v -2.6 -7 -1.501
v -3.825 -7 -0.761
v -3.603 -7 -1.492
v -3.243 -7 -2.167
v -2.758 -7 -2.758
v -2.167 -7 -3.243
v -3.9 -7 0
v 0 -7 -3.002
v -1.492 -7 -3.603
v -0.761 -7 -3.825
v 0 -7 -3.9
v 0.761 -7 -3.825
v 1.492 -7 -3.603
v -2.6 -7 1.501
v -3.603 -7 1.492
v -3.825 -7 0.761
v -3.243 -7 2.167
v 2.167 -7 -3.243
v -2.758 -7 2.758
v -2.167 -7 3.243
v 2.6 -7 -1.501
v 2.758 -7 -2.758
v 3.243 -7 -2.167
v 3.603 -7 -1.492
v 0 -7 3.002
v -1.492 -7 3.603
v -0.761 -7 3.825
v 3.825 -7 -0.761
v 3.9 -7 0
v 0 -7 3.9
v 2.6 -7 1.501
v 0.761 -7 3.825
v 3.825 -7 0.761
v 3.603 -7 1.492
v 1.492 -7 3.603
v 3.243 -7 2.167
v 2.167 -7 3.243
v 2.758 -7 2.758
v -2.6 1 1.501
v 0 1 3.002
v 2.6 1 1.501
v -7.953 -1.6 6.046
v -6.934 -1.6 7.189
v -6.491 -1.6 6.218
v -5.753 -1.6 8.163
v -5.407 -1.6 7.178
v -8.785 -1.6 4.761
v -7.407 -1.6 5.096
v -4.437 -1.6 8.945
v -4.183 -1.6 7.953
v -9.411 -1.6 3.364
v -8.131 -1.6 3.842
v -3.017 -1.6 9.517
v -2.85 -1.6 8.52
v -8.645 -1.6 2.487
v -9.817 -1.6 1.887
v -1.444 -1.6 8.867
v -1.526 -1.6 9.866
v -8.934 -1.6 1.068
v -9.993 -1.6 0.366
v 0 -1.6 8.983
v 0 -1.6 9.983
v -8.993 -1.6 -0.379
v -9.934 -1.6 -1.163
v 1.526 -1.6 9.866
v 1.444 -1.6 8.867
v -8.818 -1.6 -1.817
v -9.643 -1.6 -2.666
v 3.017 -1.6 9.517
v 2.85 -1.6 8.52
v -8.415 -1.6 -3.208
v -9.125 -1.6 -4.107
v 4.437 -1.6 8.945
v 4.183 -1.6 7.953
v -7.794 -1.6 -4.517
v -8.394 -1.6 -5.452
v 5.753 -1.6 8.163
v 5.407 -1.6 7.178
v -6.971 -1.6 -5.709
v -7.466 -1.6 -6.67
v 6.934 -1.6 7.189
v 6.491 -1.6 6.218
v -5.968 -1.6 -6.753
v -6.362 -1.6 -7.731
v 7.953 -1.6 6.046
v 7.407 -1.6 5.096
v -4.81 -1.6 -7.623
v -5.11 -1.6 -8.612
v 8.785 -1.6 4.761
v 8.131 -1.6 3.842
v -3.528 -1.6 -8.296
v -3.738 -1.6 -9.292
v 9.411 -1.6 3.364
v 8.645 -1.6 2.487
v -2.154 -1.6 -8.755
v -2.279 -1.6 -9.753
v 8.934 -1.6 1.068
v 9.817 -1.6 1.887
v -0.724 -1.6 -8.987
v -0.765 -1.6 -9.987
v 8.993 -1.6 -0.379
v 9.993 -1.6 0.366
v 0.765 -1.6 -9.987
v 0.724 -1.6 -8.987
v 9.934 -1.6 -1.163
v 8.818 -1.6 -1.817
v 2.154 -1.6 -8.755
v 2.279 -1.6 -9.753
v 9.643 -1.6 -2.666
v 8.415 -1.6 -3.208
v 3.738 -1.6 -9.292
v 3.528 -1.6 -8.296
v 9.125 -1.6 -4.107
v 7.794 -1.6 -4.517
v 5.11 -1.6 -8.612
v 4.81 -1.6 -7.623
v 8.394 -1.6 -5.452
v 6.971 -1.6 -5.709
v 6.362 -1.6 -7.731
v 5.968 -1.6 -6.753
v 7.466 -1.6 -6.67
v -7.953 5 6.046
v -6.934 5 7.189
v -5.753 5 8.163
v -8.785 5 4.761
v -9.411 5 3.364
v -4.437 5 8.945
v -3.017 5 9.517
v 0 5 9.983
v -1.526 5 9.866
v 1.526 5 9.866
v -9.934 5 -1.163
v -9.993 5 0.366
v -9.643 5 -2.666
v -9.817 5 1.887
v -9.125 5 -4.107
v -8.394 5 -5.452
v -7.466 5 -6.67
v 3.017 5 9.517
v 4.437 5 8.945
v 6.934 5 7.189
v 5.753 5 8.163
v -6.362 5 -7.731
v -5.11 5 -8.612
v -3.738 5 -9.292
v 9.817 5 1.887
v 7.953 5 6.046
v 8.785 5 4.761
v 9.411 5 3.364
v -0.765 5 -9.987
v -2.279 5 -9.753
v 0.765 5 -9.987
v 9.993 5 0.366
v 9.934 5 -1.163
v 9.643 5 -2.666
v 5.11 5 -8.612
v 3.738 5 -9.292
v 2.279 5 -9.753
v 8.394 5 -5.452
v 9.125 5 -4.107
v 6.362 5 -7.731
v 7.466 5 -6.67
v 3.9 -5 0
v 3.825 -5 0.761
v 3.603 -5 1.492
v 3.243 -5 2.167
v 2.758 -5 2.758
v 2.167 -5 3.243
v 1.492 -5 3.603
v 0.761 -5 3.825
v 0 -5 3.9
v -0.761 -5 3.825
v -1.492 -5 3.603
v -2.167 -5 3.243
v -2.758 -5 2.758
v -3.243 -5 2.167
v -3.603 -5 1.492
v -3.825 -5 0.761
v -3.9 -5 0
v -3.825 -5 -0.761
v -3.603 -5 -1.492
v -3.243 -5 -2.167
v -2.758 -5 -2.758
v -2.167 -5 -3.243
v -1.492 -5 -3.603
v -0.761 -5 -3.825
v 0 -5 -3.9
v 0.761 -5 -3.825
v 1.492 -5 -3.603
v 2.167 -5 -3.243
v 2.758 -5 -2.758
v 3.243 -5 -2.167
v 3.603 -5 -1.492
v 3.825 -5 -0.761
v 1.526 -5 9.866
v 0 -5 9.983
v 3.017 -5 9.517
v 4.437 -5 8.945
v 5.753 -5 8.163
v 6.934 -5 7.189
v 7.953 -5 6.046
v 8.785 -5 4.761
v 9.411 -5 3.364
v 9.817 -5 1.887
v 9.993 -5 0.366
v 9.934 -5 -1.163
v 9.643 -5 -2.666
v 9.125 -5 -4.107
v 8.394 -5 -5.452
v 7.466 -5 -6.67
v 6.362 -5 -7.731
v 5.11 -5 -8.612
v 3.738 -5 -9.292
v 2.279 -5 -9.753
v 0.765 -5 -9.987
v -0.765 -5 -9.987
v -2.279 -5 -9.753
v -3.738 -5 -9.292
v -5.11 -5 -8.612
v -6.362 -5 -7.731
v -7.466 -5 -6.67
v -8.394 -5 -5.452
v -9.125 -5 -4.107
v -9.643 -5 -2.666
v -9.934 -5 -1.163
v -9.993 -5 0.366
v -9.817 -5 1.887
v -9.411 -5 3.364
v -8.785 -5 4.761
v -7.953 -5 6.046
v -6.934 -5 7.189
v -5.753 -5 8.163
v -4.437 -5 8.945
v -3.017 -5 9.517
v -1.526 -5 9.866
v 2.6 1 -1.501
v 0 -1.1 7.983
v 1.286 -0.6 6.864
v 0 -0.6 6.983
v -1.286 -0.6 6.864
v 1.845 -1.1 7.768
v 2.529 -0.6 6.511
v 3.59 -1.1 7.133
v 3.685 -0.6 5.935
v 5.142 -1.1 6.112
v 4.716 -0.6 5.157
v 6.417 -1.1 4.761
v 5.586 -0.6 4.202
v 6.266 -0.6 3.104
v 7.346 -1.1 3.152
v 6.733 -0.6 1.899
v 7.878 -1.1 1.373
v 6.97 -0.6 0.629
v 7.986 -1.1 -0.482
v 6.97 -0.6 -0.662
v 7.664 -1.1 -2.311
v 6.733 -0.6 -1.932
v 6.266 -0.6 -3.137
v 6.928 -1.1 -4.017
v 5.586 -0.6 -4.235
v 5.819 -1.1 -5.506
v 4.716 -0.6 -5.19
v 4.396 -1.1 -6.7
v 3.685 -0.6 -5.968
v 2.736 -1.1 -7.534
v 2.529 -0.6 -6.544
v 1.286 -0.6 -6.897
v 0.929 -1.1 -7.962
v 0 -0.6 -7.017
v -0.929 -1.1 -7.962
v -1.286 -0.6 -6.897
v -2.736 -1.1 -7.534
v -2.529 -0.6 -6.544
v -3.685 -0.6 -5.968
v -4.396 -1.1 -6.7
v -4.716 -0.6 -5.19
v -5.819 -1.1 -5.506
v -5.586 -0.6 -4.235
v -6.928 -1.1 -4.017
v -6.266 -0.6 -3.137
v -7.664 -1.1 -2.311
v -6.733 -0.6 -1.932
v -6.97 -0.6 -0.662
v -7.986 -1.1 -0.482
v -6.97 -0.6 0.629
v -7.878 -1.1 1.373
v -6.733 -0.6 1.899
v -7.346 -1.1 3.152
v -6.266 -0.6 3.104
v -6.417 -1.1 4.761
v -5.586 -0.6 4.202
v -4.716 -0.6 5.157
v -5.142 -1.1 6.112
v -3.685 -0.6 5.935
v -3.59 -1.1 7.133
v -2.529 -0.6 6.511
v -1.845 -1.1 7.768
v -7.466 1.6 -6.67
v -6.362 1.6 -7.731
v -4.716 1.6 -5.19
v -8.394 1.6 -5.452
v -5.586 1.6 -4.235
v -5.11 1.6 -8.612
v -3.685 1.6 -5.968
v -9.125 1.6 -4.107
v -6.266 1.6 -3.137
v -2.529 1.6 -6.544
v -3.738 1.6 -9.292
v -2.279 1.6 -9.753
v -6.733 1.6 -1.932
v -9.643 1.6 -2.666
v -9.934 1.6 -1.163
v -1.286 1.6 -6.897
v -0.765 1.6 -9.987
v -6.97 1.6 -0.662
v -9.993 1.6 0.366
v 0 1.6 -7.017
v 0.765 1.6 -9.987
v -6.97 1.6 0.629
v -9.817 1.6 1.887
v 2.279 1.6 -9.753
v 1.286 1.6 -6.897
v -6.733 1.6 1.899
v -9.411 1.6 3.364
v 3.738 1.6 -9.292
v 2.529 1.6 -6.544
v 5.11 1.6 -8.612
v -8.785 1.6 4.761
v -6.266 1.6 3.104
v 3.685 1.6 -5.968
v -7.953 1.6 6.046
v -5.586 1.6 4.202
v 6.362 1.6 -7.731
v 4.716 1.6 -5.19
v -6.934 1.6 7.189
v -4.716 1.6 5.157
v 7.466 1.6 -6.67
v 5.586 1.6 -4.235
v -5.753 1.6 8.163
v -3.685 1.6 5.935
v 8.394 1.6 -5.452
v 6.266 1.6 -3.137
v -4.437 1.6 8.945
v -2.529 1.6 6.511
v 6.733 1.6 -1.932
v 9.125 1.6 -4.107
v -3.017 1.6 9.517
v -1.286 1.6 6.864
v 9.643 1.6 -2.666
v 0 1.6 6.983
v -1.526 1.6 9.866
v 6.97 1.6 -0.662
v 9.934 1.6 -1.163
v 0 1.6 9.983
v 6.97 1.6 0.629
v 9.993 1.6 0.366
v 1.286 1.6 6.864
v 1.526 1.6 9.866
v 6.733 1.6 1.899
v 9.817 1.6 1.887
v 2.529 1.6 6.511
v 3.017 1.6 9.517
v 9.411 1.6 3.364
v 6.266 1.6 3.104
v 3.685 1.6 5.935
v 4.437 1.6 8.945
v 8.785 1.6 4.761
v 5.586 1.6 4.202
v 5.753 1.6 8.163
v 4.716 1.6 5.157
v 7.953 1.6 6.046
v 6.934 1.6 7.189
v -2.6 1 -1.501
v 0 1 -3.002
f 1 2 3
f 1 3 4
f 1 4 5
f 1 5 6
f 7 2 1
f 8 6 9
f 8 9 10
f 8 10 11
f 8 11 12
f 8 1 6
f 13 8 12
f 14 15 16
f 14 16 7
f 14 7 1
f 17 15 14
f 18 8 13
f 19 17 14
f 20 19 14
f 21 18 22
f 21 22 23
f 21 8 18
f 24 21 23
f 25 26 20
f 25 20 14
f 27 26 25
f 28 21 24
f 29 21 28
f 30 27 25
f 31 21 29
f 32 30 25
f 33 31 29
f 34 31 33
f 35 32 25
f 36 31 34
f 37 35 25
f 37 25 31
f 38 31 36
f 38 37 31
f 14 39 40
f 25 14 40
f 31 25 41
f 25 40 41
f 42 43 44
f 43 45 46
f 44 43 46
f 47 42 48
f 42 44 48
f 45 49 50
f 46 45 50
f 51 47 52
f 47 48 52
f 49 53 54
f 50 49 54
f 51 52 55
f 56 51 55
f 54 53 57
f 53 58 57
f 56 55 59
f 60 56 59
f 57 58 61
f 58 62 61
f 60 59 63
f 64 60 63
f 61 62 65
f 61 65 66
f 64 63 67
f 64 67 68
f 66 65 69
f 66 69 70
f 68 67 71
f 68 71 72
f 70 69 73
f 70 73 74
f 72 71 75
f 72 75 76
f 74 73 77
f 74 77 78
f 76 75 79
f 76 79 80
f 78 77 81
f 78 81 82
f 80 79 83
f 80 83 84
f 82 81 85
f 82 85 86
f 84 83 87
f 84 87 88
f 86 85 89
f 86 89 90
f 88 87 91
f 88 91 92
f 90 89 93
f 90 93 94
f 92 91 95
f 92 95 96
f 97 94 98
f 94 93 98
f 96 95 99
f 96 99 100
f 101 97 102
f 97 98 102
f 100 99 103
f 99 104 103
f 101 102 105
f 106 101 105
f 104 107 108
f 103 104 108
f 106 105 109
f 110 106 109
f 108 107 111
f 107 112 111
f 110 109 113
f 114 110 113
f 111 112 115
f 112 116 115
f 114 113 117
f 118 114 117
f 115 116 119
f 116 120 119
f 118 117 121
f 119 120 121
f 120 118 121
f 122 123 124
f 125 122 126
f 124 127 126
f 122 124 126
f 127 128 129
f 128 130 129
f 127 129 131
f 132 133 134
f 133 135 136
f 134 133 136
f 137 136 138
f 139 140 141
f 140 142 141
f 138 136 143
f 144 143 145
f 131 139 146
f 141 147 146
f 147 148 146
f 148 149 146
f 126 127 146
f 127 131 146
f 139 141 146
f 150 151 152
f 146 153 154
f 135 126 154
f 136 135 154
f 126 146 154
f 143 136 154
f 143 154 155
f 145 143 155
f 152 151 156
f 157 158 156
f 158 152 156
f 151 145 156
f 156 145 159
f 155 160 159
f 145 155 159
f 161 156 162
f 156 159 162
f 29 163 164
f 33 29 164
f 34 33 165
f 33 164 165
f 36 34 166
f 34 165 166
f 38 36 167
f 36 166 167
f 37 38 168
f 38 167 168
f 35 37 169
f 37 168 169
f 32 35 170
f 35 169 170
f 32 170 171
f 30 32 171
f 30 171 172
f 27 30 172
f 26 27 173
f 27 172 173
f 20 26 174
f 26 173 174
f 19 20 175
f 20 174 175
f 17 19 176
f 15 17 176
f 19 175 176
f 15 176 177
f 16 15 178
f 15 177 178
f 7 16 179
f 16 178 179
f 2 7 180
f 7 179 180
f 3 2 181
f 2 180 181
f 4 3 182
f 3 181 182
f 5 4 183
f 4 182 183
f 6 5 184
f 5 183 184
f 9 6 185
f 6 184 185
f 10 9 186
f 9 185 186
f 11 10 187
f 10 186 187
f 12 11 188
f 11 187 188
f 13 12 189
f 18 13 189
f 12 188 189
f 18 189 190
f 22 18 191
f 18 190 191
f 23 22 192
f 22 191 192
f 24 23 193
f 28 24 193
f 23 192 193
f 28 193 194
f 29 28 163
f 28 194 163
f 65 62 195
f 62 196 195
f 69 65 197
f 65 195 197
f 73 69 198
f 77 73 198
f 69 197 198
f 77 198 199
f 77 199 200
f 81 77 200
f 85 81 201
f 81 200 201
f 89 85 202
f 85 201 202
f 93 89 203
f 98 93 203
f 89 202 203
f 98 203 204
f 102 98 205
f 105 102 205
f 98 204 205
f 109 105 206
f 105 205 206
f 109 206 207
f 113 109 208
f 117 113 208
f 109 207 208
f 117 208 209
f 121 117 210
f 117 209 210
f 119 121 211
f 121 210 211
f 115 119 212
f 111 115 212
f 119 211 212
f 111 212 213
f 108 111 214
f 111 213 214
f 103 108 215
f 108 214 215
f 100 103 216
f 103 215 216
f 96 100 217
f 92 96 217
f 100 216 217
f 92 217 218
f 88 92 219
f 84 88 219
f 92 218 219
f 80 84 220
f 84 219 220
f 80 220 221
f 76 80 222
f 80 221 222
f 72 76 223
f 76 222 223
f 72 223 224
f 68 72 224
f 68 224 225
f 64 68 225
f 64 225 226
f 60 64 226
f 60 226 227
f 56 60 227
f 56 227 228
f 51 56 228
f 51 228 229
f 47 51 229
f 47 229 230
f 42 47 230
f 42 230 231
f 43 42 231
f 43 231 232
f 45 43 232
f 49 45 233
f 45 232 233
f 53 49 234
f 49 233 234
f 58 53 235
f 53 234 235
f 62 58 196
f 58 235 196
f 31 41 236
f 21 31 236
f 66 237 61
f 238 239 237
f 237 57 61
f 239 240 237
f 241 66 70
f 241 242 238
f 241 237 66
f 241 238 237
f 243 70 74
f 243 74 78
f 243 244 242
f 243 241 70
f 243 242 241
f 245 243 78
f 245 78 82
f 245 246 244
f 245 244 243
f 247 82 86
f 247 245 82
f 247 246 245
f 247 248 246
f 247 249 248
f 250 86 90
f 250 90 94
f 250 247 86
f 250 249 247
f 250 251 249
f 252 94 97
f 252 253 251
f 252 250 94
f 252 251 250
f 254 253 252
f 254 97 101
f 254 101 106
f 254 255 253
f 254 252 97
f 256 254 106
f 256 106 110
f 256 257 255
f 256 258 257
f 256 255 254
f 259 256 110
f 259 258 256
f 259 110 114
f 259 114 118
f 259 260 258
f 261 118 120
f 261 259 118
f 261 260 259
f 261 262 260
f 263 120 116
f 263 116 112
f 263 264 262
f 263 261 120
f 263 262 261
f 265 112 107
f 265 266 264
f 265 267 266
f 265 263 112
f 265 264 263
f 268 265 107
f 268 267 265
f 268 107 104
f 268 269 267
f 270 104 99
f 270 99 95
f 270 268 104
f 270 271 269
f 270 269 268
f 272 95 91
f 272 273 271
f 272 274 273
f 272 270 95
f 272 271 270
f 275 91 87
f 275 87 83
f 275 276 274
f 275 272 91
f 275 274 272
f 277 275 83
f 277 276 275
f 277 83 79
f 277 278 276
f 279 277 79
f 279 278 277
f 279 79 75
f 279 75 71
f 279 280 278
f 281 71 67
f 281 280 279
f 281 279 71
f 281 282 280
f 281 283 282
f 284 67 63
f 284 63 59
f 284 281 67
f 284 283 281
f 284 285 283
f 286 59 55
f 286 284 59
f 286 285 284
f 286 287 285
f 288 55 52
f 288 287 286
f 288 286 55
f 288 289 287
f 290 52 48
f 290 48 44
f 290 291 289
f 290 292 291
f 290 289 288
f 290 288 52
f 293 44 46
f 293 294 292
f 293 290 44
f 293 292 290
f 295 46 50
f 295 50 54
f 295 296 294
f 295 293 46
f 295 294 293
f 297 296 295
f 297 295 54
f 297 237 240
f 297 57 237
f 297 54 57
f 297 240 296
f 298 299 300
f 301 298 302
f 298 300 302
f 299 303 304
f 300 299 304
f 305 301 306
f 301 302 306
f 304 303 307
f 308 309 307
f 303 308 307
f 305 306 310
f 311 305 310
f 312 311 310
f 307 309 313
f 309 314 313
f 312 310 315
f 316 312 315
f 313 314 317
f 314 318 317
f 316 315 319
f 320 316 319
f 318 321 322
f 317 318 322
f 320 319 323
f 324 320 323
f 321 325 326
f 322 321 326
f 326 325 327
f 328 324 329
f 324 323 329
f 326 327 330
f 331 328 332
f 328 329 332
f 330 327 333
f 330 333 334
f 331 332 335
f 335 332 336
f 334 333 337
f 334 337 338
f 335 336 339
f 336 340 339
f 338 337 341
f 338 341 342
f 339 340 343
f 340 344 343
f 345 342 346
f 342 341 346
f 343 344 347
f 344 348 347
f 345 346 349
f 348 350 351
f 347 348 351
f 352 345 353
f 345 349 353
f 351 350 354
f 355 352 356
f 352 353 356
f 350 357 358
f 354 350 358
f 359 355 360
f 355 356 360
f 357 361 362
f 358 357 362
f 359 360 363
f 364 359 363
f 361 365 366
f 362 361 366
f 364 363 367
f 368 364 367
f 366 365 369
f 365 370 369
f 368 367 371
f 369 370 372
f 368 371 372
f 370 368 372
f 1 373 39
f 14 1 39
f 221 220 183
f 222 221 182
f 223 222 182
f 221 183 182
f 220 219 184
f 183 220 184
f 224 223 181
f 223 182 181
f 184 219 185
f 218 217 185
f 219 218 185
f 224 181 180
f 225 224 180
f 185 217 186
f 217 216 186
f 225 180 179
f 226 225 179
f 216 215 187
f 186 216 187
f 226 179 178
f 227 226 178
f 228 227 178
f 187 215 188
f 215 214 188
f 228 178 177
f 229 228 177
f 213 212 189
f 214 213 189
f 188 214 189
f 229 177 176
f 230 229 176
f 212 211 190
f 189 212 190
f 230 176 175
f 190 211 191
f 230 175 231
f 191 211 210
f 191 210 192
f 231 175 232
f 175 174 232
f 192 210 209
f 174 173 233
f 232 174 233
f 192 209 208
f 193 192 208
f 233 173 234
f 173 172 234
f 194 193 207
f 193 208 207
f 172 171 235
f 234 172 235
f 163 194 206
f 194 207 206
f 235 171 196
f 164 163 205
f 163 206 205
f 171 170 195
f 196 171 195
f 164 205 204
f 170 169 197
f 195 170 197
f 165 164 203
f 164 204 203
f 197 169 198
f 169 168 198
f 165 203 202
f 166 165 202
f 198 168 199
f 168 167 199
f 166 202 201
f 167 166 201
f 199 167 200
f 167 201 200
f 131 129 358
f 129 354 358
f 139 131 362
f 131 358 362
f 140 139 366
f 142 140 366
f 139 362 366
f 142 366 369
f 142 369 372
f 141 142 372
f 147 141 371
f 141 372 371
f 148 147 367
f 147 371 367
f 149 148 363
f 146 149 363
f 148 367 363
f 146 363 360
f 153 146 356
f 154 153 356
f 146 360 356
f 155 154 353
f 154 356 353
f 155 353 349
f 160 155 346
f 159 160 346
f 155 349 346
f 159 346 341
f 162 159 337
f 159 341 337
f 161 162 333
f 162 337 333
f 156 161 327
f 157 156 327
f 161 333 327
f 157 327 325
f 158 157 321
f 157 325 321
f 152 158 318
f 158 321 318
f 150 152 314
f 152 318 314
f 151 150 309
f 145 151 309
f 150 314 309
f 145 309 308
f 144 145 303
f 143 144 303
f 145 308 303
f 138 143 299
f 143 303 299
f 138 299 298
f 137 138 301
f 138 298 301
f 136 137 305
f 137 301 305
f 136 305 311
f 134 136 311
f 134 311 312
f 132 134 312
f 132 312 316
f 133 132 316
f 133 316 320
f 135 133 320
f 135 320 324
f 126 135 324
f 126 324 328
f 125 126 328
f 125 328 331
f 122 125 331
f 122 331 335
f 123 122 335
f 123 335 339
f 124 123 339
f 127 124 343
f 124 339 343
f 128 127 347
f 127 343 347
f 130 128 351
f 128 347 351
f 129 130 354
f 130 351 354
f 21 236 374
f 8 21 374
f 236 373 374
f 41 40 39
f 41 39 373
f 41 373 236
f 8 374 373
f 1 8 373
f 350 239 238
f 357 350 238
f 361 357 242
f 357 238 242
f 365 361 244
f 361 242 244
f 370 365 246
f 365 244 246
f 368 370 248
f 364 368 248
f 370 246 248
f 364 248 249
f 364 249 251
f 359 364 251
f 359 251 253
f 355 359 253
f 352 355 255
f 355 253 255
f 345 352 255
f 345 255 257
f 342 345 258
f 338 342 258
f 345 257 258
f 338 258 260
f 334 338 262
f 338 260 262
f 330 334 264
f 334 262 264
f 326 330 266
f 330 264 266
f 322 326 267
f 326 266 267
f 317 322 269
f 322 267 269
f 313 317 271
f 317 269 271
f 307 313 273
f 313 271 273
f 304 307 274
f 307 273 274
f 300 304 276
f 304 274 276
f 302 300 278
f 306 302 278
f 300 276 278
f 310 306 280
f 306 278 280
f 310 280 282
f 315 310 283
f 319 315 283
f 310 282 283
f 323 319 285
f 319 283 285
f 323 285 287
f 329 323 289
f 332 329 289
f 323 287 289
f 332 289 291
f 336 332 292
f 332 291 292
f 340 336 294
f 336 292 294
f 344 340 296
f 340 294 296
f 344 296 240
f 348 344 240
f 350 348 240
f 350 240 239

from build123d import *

# Parameters (mm, degrees)
F3_DEPTH = 6
F4_SIZE2 = 1
F4_SIZE  = 2
F2_R     = 3.9
F5_DEPTH = 2


with BuildPart() as f1:
    # F0 (on Right) → F1 (revolve)
    with BuildSketch(Plane.YZ):
        Polygon((1.6, 6.9834658491), (0, 6.9834658491), (-1.6, 6.9834658491), (-1.6, 9.9834658491), (-5, 9.9834658491), (-5, -0.0165341509), (5, -0.0165341509), (5, 9.9834658491), (1.6, 9.9834658491), align=None)
    revolve(axis=Axis((0, 0, -0.0165341509), (0, 1, 0)))

    # F2 (on face) → F3 (cut)
    with BuildSketch(Plane.XZ.offset(5)):
        Polygon((2.6, -1.5011106999), (2.6, 1.5011106999), (0, 3.0022213998), (-2.6, 1.5011106999), (-2.6, -1.5011106999), (0, -3.0022213998), align=None)
    extrude(amount=-F3_DEPTH, mode=Mode.SUBTRACT)

    # F4
    f4_edges = [f1.edges().sort_by_distance(p)[0] for p in [
        (0, -1.6, -7.016534),
    ]]
    f4_side = f1.faces().sort_by_distance((0, -1.6, -7.299377))[0]
    chamfer(f4_edges, length=F4_SIZE, length2=F4_SIZE2, reference=f4_side)

    # F2 (on face) → F5 (join)
    with BuildSketch(Plane.XZ.offset(5)):
        Circle(F2_R)
        Polygon((0, 3.0022213998), (2.6, 1.5011106999), (2.6, -1.5011106999), (0, -3.0022213998), (-2.6, -1.5011106999), (-2.6, 1.5011106999), align=None, mode=Mode.SUBTRACT)
    extrude(amount=F5_DEPTH)


solid = f1.part
